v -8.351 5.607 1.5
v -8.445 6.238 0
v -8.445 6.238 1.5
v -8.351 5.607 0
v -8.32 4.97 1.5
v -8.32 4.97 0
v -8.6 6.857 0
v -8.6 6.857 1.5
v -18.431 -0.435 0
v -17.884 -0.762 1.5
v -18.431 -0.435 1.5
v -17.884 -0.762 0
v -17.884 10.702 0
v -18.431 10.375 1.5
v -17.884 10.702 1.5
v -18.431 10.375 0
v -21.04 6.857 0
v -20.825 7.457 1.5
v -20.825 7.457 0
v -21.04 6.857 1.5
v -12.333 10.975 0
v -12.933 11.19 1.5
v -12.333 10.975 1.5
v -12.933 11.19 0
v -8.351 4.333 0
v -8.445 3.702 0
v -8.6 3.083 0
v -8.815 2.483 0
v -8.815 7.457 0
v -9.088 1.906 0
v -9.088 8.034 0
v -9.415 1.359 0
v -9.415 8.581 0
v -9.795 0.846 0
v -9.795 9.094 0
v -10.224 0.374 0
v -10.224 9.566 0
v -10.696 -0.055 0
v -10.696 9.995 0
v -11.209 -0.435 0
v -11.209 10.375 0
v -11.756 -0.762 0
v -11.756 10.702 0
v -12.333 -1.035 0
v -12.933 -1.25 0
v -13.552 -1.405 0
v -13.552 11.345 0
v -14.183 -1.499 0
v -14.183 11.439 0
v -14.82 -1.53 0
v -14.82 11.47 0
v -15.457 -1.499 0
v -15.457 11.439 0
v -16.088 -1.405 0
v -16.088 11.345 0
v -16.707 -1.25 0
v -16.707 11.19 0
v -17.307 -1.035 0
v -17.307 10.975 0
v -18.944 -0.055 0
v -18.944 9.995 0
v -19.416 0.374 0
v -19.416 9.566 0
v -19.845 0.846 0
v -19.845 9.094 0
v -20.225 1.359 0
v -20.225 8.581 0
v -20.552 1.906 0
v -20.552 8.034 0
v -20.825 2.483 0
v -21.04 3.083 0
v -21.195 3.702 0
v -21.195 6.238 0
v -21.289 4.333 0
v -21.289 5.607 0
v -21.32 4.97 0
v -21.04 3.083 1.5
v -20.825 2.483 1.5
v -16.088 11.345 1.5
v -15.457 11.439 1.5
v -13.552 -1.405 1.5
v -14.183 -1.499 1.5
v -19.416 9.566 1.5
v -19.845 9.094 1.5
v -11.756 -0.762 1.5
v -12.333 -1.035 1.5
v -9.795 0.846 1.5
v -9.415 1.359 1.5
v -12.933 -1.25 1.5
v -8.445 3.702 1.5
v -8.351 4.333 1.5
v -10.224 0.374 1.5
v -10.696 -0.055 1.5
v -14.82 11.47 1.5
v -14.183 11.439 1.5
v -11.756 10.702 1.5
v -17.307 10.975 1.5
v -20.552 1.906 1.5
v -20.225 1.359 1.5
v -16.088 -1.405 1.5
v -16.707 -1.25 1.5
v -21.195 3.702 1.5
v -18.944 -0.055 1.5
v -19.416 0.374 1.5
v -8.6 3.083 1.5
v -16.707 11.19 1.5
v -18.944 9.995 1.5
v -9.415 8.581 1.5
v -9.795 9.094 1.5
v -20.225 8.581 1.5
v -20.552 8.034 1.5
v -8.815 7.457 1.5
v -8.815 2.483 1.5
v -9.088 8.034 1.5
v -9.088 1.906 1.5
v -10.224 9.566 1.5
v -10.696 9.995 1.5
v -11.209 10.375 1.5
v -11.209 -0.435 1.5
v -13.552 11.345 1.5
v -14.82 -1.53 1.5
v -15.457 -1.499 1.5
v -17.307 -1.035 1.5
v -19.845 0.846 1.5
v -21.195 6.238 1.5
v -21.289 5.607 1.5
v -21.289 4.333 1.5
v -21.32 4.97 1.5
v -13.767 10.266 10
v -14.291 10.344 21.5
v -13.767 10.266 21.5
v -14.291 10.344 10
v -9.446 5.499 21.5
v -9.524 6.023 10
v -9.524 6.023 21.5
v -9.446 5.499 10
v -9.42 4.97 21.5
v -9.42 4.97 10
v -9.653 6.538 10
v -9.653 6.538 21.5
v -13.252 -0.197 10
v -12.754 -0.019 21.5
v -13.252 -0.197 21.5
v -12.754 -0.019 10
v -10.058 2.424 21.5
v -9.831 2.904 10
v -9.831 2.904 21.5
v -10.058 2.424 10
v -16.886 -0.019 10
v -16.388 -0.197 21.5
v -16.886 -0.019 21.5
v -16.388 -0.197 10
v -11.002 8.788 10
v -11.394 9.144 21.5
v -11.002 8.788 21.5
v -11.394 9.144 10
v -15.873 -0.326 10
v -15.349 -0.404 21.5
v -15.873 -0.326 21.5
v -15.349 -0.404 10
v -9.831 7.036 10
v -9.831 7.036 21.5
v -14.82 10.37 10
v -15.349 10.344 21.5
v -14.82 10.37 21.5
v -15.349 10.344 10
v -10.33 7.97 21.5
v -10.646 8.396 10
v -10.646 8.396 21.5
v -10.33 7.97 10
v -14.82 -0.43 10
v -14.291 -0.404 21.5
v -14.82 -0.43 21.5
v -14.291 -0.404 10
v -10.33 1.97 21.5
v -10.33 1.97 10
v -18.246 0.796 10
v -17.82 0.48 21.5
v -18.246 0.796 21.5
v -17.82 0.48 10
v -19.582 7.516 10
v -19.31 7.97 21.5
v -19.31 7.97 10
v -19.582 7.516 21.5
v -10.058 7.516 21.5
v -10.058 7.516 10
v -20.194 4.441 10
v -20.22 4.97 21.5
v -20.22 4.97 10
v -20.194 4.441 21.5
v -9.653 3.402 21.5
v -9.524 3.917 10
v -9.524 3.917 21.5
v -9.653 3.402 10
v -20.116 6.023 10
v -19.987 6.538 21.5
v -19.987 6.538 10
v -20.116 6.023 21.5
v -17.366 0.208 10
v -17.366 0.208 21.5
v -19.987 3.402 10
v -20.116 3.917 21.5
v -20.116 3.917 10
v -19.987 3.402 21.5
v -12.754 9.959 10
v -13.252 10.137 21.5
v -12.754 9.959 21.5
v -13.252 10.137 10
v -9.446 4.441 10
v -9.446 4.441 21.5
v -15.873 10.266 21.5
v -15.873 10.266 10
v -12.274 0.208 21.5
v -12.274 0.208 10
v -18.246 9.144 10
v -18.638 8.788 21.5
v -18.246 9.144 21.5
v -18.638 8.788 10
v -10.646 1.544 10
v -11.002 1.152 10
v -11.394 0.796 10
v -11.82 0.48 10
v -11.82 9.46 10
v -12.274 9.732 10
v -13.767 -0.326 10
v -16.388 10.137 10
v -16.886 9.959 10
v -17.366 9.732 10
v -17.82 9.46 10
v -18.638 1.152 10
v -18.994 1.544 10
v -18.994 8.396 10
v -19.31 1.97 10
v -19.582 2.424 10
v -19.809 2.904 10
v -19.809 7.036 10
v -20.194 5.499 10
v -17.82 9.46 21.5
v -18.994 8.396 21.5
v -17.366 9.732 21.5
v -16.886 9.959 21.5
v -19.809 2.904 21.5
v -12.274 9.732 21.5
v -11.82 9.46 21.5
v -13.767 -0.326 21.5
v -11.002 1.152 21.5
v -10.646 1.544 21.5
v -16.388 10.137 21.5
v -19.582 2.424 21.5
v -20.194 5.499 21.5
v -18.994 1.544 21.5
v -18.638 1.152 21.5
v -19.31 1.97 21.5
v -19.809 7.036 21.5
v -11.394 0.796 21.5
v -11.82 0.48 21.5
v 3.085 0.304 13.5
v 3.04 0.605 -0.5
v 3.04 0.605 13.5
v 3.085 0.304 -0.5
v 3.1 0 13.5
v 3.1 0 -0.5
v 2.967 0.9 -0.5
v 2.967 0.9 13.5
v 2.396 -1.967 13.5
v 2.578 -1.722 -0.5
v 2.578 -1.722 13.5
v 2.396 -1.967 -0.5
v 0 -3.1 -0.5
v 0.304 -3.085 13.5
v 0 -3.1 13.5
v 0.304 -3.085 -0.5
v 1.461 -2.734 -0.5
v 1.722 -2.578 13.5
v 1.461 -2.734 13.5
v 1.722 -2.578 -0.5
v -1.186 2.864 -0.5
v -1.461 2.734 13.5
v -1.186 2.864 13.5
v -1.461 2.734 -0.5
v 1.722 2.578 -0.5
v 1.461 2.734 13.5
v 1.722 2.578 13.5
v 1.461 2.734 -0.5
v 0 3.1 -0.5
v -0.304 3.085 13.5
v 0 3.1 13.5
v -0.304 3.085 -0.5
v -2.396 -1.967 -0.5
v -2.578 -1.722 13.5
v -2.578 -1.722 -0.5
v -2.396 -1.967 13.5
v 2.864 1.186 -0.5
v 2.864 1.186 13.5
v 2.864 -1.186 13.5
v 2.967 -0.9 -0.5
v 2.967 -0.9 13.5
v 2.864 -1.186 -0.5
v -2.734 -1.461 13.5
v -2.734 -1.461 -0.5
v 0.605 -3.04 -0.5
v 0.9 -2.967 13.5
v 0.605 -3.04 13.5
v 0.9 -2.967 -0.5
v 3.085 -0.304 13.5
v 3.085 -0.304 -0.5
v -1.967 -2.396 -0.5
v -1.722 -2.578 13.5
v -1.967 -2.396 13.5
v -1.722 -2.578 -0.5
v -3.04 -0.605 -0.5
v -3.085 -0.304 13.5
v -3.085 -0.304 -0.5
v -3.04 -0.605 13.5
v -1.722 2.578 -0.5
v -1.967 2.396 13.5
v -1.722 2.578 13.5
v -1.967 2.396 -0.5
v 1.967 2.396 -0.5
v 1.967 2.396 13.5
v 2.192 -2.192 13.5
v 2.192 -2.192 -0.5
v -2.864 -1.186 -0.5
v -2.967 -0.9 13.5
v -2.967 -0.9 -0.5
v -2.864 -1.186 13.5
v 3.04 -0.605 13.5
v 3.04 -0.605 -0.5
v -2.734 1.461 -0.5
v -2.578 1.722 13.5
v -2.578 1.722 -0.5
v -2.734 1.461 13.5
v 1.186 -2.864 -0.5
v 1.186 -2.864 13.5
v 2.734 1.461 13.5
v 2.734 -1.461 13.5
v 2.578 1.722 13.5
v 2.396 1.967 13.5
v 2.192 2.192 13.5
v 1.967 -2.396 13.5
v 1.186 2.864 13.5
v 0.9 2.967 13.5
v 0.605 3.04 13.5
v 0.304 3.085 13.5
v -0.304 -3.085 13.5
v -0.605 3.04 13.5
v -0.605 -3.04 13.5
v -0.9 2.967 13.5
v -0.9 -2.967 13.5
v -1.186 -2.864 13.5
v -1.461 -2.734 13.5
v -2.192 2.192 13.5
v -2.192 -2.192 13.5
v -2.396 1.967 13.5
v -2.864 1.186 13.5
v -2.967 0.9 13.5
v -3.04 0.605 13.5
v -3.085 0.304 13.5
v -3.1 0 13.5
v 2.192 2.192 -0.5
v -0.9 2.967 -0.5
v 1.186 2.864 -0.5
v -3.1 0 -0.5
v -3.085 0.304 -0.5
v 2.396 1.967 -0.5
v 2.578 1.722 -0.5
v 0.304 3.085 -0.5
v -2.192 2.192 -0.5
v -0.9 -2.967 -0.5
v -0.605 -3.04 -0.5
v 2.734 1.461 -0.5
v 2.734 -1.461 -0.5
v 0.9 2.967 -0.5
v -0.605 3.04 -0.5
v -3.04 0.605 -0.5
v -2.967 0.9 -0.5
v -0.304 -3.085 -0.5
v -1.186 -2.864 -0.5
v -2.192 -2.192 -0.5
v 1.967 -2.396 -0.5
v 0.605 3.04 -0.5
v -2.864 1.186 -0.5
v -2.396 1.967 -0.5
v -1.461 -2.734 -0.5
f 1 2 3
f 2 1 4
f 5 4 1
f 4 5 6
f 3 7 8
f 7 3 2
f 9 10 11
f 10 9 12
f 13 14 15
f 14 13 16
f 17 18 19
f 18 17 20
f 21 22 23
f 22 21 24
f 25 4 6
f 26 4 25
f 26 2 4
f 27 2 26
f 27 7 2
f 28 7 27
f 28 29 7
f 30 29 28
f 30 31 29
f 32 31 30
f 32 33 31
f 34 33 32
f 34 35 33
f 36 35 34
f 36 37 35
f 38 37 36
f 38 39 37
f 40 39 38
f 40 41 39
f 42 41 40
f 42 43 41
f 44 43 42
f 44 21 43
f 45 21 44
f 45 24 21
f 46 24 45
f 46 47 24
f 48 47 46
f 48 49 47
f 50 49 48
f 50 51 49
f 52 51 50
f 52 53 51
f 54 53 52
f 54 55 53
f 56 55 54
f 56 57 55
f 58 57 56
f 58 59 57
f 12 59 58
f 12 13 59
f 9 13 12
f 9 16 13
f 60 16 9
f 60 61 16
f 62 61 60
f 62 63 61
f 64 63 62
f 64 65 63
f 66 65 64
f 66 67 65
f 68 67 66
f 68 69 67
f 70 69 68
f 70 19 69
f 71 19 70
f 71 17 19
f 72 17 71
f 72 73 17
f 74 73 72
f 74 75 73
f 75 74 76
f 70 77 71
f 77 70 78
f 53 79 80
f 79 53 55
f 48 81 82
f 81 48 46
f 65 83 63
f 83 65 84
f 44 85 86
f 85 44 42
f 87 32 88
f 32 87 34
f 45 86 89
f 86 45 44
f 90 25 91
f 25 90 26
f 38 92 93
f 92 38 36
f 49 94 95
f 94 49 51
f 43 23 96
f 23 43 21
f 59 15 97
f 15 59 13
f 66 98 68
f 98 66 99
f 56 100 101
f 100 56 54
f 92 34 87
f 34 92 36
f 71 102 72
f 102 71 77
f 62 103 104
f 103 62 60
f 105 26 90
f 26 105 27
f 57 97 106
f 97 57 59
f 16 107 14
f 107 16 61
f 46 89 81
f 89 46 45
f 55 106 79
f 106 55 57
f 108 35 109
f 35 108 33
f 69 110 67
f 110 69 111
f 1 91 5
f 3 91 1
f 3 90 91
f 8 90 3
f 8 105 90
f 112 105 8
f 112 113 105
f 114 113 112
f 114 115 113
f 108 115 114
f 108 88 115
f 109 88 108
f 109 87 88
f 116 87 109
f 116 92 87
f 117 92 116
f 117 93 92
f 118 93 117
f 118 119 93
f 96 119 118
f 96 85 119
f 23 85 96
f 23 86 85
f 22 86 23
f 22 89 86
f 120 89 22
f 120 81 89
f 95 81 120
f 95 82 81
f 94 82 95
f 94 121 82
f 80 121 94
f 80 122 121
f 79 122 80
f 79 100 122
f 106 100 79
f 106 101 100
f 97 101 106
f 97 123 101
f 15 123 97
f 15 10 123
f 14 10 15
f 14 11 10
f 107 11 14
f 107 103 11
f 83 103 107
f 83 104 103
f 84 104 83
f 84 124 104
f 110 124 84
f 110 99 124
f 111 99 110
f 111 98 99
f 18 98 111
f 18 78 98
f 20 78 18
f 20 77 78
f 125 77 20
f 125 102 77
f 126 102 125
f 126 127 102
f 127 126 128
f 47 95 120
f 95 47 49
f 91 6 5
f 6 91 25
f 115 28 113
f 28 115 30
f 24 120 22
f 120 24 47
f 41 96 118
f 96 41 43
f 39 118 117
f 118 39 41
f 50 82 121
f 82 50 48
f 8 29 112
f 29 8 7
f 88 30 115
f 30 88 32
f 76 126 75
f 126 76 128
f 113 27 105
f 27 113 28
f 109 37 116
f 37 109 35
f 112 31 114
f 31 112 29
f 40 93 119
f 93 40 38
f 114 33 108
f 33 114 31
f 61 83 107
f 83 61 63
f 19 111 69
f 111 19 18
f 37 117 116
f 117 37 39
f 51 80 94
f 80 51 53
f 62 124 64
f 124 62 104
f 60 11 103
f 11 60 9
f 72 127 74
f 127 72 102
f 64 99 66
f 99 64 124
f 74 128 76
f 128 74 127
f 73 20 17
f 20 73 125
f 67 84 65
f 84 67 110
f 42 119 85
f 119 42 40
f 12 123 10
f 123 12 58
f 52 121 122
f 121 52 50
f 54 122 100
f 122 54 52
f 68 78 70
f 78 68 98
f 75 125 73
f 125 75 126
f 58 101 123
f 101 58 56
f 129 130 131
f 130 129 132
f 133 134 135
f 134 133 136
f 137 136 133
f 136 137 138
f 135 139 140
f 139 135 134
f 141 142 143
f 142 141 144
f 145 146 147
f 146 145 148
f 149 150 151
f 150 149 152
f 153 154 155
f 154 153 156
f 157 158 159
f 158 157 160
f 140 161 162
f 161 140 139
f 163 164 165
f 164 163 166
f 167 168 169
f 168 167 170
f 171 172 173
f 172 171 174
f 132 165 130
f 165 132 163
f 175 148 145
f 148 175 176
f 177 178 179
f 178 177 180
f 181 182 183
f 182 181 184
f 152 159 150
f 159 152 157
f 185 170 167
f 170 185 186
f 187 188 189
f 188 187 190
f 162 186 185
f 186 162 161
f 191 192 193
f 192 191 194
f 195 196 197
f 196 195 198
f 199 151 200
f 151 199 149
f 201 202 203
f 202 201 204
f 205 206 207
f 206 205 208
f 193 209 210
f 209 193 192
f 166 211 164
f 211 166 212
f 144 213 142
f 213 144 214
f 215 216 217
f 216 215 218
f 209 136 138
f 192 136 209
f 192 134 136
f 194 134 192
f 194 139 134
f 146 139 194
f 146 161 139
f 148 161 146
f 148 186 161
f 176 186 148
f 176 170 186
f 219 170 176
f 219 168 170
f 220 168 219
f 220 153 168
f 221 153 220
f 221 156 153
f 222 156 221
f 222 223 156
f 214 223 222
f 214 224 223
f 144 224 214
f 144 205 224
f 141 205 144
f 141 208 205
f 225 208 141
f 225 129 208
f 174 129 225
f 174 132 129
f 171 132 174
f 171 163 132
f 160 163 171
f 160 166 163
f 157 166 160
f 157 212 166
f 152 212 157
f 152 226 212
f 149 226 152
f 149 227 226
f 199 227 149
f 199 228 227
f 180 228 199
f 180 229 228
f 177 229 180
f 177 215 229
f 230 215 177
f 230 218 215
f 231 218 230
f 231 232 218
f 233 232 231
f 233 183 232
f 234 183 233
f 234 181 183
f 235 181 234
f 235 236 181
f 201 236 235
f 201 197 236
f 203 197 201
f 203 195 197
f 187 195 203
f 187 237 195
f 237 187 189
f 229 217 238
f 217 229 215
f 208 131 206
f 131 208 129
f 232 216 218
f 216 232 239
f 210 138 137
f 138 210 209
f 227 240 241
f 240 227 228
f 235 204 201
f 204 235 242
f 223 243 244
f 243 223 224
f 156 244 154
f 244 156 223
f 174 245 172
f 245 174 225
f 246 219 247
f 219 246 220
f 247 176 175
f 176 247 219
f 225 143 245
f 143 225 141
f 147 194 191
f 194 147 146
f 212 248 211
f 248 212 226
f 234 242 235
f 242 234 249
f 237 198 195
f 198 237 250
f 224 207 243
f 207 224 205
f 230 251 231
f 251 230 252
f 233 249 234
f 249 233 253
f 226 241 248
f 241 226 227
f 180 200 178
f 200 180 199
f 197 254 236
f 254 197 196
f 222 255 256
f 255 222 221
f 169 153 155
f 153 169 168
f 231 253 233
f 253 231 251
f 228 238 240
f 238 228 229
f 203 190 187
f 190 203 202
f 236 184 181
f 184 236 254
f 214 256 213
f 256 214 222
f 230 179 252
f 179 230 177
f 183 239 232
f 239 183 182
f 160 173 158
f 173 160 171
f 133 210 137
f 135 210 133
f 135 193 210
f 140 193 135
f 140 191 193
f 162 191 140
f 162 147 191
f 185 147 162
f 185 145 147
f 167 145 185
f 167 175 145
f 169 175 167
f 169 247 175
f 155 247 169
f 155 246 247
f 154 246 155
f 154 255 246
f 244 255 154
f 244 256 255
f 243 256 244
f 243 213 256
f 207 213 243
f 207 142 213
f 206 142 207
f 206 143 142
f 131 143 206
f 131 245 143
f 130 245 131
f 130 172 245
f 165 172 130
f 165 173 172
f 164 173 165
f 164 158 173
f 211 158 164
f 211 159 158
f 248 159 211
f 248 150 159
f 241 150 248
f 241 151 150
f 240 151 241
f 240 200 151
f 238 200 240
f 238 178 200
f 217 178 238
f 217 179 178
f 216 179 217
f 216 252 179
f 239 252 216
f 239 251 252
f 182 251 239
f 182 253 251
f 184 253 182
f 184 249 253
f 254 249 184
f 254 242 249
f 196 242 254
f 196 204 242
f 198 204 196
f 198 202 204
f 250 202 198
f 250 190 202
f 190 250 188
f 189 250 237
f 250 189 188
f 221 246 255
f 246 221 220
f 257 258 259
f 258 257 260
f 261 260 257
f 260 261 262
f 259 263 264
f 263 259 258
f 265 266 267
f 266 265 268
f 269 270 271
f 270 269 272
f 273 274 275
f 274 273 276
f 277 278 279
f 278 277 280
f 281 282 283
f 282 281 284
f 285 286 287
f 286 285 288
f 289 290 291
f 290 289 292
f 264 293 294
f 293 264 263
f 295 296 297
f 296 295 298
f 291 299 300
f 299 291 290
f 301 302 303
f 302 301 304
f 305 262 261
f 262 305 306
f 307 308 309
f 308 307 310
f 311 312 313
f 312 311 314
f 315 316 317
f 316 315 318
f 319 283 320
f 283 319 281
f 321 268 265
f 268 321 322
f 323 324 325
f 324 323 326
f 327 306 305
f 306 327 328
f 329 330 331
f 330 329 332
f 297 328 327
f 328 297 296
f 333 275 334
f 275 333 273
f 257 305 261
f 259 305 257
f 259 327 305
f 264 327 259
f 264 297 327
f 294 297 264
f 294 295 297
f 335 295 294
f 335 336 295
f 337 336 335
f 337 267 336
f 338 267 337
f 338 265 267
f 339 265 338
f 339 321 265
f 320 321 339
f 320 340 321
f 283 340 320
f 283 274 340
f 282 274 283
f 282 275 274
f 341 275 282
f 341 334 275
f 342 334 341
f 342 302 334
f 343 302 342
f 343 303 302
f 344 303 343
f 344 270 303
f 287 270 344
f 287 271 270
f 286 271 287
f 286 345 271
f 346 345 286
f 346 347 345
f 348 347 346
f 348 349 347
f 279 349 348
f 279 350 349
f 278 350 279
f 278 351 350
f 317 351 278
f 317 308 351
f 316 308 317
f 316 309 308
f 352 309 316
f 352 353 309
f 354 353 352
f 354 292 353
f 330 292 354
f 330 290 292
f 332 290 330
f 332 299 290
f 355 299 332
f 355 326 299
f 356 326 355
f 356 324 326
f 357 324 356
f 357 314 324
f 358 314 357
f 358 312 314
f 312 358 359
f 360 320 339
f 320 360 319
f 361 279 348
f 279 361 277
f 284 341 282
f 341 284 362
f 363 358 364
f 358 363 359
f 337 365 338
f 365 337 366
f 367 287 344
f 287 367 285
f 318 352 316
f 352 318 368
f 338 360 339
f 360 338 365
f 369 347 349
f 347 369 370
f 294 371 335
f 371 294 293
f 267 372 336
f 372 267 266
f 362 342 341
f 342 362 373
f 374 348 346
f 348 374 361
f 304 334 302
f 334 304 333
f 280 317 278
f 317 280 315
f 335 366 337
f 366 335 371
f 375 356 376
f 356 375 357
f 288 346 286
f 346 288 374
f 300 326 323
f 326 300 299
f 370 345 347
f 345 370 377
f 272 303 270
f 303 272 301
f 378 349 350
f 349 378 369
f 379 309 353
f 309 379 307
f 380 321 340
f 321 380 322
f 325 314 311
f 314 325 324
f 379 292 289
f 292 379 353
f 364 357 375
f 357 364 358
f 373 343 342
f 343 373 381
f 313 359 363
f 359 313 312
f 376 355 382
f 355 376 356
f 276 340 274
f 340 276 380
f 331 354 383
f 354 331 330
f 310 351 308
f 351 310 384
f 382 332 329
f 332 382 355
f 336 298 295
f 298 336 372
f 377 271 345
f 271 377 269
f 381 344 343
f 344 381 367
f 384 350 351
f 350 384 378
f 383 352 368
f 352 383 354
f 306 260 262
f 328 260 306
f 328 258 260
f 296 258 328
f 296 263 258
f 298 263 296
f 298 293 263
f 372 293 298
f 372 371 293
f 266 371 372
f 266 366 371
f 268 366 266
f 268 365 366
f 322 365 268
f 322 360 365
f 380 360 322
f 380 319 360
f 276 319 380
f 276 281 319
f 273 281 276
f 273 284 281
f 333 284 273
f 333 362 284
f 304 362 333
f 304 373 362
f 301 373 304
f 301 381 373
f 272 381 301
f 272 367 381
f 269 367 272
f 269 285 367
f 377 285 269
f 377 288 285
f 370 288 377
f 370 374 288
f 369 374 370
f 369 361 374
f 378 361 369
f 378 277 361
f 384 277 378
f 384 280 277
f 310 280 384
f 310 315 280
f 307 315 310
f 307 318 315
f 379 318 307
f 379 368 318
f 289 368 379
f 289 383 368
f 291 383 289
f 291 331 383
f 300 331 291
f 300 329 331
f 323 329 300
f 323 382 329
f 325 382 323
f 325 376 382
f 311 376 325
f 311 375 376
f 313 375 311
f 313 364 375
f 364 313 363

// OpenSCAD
// Adapter sleeve: 0.2 mL PCR tube in a 1.5 mL rack hole
// Print orientation: collar on the bed (z = 0), sleeve body builds upward.
// Placed using the user's coordinates: x = -14.82, y = 4.97.

$fn = 64;

// ---- Dimensions (mm) ----
collar_d      = 13;     // collar diameter
collar_h      = 1.5;    // collar thickness (z = 0 to 1.5)
sleeve_od     = 10.8;   // sleeve body outer diameter
sleeve_top_z  = 21.5;   // top of sleeve body (body runs z = 10 to 21.5)
bore_d        = 6.2;    // straight through-bore diameter
eps           = 0.5;    // cutter overshoot past faces

// ---- Derived ----
sleeve_h      = sleeve_top_z - 10;   // sleeve body height (11.5 mm)
collar_area   = (collar_d / 2) * (collar_d / 2) * 3.1416;
sleeve_area   = (sleeve_od / 2) * (sleeve_od / 2) * 3.1416;
overlap       = (sleeve_od / 2) * (sleeve_od / 2) * 0.001; // small overlap into collar for a clean union

// ---- Model ----
translate([-14.82, 4.97, 0])
    union() {
        // Collar (z = 0 to 1.5)
        cylinder(d = collar_d, h = collar_h);
        // Sleeve body (z = 10 to 21.5)
        translate([0, 0, 10])
            cylinder(d = sleeve_od, h = sleeve_h);
    }
// ---- Bore ----
translate([0, 0, -eps])
    cylinder(d = bore_d, h = collar_h + sleeve_h + 2 * eps);
